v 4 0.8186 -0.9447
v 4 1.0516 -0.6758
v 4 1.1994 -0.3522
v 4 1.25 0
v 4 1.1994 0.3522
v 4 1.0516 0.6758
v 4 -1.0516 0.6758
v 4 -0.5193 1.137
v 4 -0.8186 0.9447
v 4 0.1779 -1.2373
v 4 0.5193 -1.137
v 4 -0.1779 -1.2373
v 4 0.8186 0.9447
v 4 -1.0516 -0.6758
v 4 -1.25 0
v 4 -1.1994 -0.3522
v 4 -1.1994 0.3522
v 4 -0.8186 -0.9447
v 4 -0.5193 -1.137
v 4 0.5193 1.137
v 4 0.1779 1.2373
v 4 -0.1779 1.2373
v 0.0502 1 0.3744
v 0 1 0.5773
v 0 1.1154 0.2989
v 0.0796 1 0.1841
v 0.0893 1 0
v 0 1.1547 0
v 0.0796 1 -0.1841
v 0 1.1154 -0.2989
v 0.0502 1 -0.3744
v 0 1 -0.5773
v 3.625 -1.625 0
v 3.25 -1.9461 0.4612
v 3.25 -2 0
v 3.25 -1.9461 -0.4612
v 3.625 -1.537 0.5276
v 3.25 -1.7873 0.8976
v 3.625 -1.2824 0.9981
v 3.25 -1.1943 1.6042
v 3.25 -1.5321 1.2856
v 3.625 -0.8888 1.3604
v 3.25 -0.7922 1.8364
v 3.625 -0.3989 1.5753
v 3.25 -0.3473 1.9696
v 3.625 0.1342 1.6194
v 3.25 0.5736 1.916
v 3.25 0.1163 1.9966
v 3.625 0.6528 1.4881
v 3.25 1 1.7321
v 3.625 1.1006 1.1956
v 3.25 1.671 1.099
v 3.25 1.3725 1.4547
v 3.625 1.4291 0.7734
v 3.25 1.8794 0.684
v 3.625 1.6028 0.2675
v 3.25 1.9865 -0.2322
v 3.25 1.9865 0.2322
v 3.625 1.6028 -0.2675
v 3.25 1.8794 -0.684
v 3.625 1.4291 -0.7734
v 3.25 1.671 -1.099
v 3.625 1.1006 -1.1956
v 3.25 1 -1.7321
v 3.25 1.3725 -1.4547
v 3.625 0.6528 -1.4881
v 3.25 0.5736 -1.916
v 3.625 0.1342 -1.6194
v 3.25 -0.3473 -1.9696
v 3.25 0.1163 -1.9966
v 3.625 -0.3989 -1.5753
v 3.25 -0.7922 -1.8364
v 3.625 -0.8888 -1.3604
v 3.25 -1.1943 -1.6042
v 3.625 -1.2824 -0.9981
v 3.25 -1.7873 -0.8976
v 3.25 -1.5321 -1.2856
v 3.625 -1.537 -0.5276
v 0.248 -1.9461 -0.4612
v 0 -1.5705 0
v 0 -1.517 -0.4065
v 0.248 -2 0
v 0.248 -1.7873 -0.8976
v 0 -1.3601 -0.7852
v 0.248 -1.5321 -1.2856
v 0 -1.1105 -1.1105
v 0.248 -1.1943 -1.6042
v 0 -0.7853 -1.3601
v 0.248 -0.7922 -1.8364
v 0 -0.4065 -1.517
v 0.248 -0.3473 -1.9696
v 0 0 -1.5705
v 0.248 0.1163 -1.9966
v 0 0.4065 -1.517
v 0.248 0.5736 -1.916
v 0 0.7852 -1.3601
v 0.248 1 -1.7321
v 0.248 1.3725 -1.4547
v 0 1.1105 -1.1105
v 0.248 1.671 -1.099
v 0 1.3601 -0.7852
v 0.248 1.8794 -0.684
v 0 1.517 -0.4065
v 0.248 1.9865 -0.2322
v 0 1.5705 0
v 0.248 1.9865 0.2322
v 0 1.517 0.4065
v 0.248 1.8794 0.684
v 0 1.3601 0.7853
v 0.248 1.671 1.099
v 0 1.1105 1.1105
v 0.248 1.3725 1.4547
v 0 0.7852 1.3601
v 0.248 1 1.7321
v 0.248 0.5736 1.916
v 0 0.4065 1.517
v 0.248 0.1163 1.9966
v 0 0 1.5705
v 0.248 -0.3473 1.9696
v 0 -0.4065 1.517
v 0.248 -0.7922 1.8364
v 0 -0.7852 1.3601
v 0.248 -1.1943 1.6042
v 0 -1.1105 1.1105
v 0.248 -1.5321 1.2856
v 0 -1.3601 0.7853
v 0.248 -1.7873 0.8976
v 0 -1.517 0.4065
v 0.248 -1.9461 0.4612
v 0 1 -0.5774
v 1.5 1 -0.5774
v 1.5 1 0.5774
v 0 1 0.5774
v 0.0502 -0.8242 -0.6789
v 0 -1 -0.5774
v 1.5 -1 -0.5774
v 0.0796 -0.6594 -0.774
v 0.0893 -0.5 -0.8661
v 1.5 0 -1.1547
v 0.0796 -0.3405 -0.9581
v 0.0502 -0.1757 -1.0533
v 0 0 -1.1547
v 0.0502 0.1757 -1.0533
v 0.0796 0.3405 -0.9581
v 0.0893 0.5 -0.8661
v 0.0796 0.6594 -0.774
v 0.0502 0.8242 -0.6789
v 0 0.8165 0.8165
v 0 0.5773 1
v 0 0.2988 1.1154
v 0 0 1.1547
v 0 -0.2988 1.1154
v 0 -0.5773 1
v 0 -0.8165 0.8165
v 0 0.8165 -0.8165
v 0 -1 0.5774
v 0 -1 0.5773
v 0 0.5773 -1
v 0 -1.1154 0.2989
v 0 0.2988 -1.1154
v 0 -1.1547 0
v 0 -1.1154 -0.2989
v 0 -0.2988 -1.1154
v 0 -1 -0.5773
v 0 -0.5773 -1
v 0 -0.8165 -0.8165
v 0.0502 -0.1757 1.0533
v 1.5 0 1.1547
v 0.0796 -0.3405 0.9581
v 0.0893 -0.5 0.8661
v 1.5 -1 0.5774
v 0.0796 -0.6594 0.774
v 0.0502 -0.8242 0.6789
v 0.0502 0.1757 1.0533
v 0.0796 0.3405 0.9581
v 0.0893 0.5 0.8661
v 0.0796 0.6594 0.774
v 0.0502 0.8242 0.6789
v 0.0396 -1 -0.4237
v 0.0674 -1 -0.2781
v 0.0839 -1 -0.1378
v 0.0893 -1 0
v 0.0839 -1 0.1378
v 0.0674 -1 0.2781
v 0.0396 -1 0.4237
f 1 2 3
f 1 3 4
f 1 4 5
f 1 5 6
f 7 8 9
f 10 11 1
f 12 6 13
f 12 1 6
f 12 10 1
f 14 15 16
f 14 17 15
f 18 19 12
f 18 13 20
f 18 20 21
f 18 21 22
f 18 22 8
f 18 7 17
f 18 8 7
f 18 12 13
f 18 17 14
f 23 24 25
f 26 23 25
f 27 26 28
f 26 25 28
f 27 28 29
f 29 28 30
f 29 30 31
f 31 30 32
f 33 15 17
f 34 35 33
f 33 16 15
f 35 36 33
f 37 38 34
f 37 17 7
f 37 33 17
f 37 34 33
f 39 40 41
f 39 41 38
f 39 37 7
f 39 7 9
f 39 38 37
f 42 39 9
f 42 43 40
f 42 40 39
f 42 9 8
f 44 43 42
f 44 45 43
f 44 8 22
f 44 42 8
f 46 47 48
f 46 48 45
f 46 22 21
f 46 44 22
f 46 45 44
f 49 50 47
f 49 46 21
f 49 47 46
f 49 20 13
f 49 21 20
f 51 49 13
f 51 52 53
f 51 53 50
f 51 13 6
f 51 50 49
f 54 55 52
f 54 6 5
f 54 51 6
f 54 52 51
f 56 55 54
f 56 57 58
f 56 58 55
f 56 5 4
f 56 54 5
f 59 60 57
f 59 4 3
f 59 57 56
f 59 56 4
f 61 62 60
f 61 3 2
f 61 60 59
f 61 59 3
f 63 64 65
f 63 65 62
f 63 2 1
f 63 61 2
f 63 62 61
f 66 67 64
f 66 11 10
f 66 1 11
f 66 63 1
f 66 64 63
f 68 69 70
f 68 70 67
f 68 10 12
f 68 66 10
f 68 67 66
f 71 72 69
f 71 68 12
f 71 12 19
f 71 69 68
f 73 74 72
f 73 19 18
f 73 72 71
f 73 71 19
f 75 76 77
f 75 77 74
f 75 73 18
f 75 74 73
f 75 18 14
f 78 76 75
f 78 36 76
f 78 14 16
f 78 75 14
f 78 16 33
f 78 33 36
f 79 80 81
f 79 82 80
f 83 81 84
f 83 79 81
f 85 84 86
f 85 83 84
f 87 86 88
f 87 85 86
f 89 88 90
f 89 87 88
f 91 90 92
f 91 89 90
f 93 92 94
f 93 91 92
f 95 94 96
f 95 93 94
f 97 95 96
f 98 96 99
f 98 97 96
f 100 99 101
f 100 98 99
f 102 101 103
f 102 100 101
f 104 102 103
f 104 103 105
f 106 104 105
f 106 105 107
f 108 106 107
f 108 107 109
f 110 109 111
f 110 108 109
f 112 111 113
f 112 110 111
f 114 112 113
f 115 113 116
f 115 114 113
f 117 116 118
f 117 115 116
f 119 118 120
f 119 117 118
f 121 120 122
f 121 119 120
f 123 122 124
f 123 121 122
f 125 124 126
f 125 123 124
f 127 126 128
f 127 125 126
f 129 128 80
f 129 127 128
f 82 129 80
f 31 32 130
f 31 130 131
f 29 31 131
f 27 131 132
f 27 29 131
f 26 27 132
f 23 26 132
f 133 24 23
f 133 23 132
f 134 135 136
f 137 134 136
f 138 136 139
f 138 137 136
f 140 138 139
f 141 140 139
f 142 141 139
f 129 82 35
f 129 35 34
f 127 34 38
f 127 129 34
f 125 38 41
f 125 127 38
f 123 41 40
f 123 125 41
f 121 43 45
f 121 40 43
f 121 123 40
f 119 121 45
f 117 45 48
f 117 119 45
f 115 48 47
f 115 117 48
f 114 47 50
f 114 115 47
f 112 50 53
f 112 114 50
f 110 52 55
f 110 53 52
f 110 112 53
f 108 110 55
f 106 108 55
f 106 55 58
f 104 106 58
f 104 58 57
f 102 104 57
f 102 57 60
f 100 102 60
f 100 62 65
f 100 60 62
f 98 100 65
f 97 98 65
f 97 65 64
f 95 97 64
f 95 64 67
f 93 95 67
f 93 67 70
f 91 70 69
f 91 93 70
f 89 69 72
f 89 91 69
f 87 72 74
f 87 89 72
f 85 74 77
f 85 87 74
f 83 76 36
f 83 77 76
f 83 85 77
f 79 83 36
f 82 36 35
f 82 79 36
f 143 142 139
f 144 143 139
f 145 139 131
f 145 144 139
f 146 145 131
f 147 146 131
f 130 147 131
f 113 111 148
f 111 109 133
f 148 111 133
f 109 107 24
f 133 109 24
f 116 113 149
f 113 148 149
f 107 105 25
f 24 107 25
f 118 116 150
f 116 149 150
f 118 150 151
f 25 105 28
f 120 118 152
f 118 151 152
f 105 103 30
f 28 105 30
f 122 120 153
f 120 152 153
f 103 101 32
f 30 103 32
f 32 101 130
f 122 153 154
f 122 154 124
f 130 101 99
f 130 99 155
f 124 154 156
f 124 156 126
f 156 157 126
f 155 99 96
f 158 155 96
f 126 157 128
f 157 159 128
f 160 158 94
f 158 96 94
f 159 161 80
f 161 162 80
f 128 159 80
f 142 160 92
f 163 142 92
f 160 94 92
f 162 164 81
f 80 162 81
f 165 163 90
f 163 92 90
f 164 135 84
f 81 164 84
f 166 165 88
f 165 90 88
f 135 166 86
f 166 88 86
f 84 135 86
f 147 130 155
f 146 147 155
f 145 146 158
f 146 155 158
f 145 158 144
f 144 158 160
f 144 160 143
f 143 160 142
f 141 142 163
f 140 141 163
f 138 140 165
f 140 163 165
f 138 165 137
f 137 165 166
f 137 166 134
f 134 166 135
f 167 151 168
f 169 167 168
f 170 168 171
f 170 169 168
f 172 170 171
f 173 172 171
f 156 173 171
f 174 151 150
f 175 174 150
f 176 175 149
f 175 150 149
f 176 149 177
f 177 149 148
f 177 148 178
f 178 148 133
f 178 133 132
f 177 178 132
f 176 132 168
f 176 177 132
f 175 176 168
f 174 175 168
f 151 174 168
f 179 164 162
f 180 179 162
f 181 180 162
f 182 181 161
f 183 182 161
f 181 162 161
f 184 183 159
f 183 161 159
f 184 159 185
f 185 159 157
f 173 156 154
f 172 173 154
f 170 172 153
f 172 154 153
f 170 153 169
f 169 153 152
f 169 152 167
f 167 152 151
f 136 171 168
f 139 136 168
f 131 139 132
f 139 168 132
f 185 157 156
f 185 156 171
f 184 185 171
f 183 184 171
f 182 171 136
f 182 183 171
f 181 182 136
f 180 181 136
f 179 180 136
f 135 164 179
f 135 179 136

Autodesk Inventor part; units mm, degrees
sketch "Sketch_1" plane through (0, 0, 0) normal (0, 0, 1) x (1, 0, 0)
  line L0 (0.6667, 0) -> (4, 0)
  line L1 (4, 0) -> (4, -1.25)
  line L2 (4, -1.25) -> (3.25, -2)
  line L3 (3.25, -2) -> (0.248, -2)
  line L4 (0.248, -2) -> (0, -1.5705)
  line L5 (0, -1.5705) -> (0, -1.1547)
  line L6 (0, -1.1547) -> (0.6667, 0)
  line L7 (0.6667, 0) -> (4, 0)
revolve "Revolution1" add sketch "Sketch_1" angle 360 about axis through (0.6667, 0, 0) along (1, 0, 0)
thread "Thread1" size "M4x0.7" class "6g" standard "ISO Metric profile" full length
sketch "Sketch_2" plane through (0, 0, 0) normal (1, 0, 0) x (0, 1, 0)
  line L0 (0, 1.1547) -> (-1, 0.5774)
  line L1 (-1, 0.5774) -> (-1, -0.5774)
  line L2 (-1, -0.5774) -> (0, -1.1547)
  line L3 (0, -1.1547) -> (1, -0.5774)
  line L4 (1, -0.5774) -> (1, 0.5774)
  line L5 (1, 0.5774) -> (0, 1.1547)
extrude "Extrusion1" cut sketch "Sketch_2" along normal blind 1.5
ref_plane "IP1_XY" through (0, 0, 0) normal (1, 0, 0) x (0, 0, -1)
ref_plane "IP1_YZ" through (0, 0, 0) normal (0, 0, -1) x (0, 1, 0)
ref_plane "IP1_ZX" through (0, 0, 0) normal (0, 1, 0) x (1, 0, 0)
ref_plane "IP2_XY" through (4, 0, 0) normal (1, 0, 0) x (0, 0, -1)
ref_plane "IP2_YZ" through (4, 0, 0) normal (0, 0, -1) x (0, 1, 0)
ref_plane "IP2_ZX" through (4, 0, 0) normal (0, 1, 0) x (1, 0, 0)
properties part number "Hexagon socket set screw with flat point DIN 913 - M4x4" material "鋼、炭素鋼"
